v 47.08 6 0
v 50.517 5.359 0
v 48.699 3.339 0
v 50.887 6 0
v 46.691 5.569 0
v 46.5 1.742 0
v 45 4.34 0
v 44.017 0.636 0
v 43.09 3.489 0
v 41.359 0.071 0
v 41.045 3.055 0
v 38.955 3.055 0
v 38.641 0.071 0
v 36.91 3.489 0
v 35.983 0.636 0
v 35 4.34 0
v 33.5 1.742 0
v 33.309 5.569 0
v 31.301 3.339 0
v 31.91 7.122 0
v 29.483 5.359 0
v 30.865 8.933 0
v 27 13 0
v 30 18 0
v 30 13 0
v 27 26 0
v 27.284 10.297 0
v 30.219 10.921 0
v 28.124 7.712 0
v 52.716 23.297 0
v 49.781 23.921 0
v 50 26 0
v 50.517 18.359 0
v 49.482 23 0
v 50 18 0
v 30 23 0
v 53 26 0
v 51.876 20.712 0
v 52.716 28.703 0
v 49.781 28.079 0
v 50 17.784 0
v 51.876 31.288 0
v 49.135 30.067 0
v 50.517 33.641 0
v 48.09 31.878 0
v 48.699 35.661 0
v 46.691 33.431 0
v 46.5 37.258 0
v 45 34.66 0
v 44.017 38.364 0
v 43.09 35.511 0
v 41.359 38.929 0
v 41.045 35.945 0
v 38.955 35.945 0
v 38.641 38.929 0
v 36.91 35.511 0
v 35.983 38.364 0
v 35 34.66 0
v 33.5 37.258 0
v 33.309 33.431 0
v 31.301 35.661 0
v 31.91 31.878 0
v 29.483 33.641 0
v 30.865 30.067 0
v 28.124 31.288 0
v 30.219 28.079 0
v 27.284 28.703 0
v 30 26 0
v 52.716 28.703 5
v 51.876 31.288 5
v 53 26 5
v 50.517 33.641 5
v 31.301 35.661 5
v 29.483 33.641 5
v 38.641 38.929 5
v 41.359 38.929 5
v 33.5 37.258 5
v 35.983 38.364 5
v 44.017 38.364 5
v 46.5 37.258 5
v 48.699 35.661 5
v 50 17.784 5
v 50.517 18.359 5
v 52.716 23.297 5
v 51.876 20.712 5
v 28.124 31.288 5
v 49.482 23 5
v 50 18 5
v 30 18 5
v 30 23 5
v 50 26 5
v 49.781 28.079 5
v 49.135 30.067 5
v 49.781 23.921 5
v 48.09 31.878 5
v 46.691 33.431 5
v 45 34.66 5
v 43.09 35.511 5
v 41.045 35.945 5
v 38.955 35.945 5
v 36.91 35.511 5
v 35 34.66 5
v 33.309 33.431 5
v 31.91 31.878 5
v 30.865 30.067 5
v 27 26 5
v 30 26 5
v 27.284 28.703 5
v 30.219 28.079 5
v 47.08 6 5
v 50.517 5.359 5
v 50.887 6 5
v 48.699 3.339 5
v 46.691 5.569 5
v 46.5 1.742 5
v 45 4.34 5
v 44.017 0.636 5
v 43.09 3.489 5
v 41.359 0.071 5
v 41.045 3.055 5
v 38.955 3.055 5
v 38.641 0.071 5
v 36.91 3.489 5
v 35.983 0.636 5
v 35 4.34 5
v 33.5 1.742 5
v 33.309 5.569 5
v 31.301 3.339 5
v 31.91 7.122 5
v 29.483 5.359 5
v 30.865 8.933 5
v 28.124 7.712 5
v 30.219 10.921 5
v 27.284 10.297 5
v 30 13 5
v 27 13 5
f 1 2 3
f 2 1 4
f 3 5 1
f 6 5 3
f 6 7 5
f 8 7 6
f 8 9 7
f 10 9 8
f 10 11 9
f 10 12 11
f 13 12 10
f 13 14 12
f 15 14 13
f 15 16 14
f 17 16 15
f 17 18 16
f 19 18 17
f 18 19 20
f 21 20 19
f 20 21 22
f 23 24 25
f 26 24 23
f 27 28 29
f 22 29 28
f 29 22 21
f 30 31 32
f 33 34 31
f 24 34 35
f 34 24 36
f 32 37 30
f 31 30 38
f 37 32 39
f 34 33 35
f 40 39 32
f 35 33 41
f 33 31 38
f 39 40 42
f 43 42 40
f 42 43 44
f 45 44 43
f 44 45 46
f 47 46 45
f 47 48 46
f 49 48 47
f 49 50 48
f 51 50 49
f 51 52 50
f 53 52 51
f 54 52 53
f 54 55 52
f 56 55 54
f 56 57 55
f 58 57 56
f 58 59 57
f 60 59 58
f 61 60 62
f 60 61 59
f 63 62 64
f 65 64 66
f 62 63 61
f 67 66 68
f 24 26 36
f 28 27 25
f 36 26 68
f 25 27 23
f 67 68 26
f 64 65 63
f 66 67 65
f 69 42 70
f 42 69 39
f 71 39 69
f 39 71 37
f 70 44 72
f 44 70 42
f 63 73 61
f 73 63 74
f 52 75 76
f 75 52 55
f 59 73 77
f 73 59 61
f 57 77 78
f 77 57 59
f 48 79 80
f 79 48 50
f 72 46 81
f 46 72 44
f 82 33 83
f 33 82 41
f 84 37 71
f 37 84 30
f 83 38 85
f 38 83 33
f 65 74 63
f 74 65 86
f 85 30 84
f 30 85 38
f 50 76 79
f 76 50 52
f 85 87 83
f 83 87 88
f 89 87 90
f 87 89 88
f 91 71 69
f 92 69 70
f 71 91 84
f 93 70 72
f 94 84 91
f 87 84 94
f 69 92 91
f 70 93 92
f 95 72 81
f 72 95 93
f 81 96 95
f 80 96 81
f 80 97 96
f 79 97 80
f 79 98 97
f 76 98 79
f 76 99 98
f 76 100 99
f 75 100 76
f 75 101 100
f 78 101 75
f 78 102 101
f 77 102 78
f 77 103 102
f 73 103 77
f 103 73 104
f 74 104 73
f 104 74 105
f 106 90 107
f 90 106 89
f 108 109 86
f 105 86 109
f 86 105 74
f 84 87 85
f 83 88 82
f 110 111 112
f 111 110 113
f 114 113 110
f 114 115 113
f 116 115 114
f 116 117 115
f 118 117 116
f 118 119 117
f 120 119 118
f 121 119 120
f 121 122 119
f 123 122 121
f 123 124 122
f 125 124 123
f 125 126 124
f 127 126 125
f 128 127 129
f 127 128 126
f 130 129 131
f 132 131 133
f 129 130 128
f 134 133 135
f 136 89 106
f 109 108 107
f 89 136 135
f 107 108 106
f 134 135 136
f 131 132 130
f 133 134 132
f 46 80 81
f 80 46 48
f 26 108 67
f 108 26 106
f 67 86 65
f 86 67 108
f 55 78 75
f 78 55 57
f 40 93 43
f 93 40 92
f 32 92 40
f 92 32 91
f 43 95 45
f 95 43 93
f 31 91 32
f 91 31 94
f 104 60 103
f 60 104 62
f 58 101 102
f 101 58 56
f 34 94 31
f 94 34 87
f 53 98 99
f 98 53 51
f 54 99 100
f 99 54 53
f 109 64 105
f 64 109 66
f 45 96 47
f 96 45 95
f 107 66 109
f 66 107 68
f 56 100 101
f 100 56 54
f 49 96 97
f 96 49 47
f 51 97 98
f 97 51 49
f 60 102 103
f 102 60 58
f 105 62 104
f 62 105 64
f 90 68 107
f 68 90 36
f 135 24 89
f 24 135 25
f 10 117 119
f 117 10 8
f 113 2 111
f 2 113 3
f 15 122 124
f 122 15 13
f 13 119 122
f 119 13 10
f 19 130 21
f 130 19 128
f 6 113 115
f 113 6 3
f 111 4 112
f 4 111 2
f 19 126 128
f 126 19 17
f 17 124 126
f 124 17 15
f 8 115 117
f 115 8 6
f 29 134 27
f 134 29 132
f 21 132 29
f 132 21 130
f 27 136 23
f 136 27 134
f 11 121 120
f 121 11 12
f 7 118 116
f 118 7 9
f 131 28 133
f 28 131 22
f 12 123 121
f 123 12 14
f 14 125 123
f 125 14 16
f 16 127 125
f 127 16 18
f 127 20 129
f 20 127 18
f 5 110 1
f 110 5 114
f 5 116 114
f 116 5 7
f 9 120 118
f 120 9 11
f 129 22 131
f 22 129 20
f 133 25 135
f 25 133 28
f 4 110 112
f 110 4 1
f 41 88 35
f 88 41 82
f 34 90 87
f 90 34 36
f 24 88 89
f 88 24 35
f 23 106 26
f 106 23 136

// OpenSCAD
z=5;
x=13;
2x=10;
//буква e

union(){
	translate([28,18,0]) cube([22,z,z]);
	translate([27,13,0]) cube([-2x+13,x,z]);
difference(){
union(){
	
  difference(){
  translate([40,26,0]) cylinder(z,x,x);
  translate([40,26,-1]) cylinder(z+2,2x,2x);
  translate([30,12,-1]) cube([16,2x,z+2]);

}

difference(){
  translate([40,13,0]) cylinder(z,x,x);
  translate([40,13,-1]) cylinder(z+2,2x,2x);
  translate([32,15,-1]) cube([19,x,z+2]);
  translate([40,6,-1]) cube(20);
}
}
	translate([30,13,-1]) cube([z,x,z+2]);
	translate([40,10,-1]) cube(10);
}
}
